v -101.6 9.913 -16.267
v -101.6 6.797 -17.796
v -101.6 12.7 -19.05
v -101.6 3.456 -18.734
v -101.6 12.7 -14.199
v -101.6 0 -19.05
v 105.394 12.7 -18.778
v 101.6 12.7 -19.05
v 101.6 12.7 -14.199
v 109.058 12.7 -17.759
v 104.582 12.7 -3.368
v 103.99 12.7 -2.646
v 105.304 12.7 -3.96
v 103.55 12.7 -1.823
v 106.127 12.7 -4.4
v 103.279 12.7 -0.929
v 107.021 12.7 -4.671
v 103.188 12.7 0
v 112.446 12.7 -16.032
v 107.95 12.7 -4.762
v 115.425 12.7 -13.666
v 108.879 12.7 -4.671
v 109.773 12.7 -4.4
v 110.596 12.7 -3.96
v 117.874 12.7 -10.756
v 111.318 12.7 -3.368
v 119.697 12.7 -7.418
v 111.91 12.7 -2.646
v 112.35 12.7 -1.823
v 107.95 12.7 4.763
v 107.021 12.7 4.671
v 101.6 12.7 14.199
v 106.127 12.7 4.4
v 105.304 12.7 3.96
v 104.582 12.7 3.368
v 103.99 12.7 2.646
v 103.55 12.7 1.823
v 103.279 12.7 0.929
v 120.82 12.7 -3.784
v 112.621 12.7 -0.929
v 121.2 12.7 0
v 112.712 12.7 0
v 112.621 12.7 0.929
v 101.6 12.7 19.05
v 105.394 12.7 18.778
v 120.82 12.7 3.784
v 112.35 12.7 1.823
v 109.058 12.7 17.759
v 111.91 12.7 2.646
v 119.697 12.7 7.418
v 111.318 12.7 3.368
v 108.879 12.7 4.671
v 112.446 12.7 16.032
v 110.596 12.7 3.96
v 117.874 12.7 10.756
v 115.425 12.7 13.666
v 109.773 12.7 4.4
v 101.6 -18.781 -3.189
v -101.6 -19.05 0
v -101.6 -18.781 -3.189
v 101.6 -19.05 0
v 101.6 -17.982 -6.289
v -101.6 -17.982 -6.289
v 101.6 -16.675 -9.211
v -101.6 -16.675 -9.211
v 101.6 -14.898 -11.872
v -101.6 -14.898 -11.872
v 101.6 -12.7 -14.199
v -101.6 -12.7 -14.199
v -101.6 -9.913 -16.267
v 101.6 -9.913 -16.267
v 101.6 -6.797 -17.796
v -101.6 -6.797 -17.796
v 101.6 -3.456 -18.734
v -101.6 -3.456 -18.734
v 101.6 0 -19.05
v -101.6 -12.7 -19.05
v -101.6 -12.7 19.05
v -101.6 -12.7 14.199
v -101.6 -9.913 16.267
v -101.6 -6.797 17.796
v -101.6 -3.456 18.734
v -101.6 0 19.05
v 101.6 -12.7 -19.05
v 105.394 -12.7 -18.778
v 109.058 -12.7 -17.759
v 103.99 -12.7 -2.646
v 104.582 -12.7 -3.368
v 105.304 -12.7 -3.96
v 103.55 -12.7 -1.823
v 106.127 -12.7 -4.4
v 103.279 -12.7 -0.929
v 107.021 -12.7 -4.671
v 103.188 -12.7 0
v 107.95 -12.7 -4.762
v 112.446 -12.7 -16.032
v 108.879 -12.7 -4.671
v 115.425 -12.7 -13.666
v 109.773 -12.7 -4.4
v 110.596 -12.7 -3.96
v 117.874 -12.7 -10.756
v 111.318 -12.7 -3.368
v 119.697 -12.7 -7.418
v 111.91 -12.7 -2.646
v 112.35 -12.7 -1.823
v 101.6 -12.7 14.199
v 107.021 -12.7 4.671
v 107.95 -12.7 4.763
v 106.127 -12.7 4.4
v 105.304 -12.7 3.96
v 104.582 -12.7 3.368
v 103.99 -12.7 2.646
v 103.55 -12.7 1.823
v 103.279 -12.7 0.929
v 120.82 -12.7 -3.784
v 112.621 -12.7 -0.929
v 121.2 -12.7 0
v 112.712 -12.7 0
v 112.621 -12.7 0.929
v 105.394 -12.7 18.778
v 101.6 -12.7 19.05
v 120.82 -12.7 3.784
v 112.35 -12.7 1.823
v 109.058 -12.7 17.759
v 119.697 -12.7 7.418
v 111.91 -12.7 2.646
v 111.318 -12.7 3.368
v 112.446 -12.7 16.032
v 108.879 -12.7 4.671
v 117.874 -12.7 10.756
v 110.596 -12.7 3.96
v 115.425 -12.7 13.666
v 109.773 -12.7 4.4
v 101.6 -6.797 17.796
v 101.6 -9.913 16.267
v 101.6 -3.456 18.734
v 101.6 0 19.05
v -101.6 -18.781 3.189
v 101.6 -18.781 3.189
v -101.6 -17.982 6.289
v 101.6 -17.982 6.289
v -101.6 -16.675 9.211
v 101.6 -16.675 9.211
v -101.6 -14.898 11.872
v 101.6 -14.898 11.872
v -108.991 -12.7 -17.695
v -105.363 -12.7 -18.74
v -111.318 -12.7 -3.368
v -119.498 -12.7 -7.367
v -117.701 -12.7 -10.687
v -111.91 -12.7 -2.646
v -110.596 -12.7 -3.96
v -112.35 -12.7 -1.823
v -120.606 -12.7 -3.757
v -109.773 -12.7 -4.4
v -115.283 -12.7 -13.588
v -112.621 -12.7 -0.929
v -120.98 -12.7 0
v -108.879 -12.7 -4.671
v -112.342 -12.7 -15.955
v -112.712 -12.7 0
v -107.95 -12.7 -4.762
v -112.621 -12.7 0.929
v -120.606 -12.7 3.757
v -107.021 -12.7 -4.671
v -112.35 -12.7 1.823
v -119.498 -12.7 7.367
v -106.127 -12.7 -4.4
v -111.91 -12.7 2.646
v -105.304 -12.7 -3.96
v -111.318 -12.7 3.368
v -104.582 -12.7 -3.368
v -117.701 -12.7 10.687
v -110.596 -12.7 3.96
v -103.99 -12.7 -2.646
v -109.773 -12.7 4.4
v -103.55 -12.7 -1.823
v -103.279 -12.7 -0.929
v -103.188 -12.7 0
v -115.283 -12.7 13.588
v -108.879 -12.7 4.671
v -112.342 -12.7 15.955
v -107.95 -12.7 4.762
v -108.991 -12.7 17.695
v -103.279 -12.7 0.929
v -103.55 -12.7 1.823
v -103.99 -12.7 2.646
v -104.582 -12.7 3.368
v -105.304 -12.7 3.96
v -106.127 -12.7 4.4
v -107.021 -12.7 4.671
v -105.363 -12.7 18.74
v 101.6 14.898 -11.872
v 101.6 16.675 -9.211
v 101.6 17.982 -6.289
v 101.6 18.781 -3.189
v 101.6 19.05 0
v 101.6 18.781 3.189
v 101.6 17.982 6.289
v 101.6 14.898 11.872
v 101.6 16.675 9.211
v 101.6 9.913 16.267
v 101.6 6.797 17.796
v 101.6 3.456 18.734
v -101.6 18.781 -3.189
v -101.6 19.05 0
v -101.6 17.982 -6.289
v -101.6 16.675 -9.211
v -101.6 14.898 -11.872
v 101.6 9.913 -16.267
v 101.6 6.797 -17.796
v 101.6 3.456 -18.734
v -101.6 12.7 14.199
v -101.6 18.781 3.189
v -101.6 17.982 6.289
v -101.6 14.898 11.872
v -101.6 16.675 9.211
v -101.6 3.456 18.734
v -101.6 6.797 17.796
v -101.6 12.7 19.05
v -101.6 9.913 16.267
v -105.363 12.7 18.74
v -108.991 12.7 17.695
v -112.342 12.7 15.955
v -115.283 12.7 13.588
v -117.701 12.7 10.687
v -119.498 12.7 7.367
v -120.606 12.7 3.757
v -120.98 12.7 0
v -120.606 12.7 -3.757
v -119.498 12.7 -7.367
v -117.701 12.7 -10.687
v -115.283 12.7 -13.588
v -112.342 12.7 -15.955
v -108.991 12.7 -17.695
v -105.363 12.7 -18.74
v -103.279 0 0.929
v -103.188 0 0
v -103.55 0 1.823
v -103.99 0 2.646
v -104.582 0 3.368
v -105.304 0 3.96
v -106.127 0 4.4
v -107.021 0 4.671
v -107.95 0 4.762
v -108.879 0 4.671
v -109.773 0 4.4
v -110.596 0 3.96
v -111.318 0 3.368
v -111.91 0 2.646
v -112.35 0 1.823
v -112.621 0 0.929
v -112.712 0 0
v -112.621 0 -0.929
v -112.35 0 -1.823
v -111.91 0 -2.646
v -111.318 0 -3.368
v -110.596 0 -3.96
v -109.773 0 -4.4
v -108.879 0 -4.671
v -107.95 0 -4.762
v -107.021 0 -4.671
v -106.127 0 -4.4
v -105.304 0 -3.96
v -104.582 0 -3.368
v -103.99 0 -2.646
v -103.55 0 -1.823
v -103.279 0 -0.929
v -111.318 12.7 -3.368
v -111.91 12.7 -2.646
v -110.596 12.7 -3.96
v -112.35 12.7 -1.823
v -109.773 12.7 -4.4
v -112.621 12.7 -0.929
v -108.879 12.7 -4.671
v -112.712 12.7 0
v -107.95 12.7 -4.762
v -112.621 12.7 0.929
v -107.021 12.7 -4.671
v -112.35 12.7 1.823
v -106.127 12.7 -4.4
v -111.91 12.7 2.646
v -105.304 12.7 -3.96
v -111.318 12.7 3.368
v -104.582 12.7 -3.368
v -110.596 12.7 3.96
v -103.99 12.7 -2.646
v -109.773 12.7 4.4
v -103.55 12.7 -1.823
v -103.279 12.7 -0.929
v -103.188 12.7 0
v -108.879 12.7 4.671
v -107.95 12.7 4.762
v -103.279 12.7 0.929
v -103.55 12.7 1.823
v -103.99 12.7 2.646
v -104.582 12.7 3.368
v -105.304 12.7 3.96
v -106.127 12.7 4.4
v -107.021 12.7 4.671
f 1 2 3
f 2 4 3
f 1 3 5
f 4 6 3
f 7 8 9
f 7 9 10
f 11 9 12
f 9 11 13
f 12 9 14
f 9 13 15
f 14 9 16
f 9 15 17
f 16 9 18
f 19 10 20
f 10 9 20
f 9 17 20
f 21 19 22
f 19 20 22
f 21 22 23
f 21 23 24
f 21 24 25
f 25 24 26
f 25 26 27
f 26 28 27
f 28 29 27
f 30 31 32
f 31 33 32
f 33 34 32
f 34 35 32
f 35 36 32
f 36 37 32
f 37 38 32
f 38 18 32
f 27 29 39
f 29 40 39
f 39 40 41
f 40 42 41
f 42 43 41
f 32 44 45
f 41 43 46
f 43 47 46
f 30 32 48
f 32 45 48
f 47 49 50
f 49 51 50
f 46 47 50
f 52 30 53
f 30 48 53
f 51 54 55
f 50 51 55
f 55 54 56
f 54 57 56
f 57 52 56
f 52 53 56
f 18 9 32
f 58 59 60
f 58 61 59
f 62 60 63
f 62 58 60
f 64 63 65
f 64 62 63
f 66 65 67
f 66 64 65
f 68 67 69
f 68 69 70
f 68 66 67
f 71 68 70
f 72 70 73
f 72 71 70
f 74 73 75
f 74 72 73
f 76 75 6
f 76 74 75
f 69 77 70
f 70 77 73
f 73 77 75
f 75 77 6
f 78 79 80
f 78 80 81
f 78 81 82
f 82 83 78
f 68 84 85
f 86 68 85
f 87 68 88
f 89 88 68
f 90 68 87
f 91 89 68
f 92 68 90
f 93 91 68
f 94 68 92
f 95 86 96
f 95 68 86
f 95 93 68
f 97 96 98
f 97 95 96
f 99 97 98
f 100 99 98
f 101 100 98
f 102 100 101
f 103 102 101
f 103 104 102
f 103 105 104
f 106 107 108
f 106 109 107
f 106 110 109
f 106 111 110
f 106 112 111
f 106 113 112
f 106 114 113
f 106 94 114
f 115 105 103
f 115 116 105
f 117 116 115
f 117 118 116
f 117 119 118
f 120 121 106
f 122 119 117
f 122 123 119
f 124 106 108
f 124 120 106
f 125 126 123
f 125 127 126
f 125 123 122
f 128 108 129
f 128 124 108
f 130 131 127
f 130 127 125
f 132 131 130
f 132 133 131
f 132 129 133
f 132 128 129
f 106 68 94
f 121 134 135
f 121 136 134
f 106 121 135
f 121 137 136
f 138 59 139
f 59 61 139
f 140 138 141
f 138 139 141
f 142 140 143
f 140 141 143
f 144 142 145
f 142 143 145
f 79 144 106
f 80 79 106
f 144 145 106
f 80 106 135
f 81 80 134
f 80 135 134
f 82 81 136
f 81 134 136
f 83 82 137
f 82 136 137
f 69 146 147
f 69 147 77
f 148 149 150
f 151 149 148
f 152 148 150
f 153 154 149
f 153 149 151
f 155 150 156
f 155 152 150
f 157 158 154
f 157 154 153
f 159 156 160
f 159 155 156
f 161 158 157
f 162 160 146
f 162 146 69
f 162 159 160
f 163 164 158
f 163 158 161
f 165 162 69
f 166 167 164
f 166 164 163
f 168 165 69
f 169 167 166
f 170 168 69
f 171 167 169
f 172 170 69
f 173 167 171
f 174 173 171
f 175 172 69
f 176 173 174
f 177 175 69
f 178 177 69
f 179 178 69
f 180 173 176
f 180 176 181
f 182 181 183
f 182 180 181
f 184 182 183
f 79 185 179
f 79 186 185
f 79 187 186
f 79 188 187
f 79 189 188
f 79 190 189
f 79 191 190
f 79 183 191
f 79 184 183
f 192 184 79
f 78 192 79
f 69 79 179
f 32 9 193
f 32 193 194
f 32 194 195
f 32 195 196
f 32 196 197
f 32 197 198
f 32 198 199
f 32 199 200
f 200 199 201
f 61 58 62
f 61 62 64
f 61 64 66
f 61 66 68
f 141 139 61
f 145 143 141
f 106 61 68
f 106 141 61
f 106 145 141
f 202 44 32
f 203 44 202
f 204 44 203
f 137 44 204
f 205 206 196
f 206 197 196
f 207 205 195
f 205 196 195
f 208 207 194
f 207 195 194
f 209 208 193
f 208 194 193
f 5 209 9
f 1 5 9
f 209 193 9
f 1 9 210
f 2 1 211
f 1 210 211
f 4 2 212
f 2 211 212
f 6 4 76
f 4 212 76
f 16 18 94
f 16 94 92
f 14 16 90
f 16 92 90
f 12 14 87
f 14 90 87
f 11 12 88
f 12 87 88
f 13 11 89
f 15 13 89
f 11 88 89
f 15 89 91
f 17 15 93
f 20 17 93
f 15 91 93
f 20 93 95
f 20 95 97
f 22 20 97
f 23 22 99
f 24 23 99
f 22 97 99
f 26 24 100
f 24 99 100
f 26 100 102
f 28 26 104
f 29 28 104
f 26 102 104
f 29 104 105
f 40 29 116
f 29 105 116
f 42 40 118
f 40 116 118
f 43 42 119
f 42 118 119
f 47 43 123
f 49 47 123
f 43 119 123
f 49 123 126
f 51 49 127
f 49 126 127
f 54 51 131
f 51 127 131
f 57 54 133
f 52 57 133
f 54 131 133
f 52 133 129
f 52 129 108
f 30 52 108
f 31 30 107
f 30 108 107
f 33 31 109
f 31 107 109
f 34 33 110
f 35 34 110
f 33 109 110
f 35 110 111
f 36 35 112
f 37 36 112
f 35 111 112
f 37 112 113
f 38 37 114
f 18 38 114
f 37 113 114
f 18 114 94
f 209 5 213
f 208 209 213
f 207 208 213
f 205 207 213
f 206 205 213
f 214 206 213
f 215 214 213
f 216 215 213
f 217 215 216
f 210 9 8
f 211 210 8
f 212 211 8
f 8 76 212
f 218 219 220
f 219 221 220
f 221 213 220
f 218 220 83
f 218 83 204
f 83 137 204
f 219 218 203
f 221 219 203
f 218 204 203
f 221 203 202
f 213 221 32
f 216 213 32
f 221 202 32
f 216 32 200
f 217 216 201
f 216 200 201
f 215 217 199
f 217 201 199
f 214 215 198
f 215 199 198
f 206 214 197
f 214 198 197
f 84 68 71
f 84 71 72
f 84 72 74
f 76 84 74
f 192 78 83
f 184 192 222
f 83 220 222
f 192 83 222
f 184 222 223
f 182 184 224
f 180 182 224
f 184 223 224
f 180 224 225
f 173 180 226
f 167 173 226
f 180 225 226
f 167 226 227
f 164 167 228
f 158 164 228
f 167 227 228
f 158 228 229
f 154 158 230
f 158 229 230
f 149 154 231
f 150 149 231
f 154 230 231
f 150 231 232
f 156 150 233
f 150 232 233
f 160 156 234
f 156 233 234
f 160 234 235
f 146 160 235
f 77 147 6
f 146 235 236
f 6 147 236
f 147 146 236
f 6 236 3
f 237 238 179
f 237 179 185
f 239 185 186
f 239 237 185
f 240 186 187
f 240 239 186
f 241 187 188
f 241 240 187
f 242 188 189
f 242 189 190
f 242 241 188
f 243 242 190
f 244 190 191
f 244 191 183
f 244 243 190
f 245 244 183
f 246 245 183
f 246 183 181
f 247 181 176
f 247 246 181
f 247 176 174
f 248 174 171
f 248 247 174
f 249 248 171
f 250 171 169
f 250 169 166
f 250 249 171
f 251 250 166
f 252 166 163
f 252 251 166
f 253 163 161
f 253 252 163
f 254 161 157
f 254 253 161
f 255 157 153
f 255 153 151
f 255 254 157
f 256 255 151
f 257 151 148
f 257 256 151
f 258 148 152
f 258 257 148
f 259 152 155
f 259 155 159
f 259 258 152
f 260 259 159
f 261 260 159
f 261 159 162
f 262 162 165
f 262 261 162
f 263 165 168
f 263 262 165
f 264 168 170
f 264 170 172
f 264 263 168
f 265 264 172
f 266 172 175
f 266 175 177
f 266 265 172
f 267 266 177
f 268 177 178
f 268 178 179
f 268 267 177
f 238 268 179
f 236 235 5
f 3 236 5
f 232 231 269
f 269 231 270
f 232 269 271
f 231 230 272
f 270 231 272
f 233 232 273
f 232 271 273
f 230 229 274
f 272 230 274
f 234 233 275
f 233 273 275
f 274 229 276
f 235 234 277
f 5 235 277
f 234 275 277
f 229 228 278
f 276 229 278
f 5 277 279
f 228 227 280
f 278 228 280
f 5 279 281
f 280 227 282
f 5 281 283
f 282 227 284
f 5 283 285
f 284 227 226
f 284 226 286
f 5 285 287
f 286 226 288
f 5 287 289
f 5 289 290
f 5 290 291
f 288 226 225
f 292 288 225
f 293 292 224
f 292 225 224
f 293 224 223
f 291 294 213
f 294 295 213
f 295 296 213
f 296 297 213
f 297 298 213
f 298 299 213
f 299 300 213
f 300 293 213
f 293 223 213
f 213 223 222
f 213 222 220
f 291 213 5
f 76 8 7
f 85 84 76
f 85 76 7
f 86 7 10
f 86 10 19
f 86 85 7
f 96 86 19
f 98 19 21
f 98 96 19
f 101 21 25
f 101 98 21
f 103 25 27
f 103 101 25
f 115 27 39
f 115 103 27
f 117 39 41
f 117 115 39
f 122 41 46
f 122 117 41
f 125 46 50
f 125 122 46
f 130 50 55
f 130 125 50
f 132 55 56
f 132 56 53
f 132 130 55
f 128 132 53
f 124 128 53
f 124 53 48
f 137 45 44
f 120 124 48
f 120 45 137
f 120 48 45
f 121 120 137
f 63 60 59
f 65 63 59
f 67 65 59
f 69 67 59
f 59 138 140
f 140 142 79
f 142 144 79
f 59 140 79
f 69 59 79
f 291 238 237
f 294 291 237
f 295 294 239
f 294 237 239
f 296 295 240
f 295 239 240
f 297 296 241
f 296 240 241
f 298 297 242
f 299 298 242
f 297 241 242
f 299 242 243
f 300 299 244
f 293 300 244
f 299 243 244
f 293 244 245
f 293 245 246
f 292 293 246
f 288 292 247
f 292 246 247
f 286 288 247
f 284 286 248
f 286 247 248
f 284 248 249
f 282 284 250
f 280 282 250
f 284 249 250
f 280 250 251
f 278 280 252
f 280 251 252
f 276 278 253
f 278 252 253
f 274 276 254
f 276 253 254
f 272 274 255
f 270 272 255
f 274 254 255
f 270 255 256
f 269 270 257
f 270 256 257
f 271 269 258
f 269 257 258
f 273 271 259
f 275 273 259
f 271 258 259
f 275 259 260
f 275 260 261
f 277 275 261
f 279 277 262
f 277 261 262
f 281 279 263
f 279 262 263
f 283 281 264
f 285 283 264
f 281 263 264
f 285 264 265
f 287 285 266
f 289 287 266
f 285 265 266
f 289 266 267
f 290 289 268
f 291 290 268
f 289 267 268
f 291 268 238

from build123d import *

# Parameters (mm, degrees)
F0_W     = 203.2
F0_H     = 38.1
F1_DEPTH = 19.05
F2_R     = 19.04999
F4_DEPTH = 12.7
F5_R     = 4.7625
F6_DEPTH = 12.7


# Not quite as in the source:
# - a fillet or chamfer is up to 0.001 mm smaller than in the source, because OpenCascade refuses the exact size


with BuildPart() as f1:
    # F0 (on Front) → F1 (new body, symmetric)
    with BuildSketch(Plane.XZ):
        Rectangle(F0_W, F0_H)
    extrude(amount=F1_DEPTH, both=True)

    # F2 (radius 19.05 in the source; OpenCascade refuses exactly that, so slightly less here)
    f2_edges = [f1.edges().sort_by_distance(p)[0] for p in [
        (0, -19.05, 19.05),
        (0, 19.05, 19.05),
        (0, 19.05, -19.05),
        (0, -19.05, -19.05),
    ]]
    fillet(f2_edges, radius=F2_R)

    # F3 (on Front) → F4 (join, symmetric)
    with BuildSketch(Plane.XZ):
        with BuildLine():
            Line((-101.6, -19.0500002354), (-101.6, 0))
            Line((-101.6, 0), (-101.6, 19.05))
            ThreePointArc((-101.6, 19.05), (-120.9801457995, -1.177e-07), (-101.6, -19.0500002354))
        make_face()
        with BuildLine():
            Line((101.6, 19.05), (101.6, 0))
            Line((101.6, 0), (101.6, -19.0500002354))
            ThreePointArc((101.6, -19.0500002354), (121.1996012404, -1.177e-07), (101.6, 19.05))
        make_face()
    extrude(amount=F4_DEPTH, both=True)

    # F5 (on Front) → F6 (cut, symmetric)
    with BuildSketch(Plane.XZ):
        with Locations((-107.95, 0)):
            Circle(F5_R)
        with BuildLine():
            ThreePointArc((112.7125, 0), (107.95, 4.7625), (103.1875, 0))
            ThreePointArc((103.1875, 0), (107.95, -4.7625), (112.7125, 0))
        make_face()
    extrude(amount=F6_DEPTH, both=True, mode=Mode.SUBTRACT)


solid = f1.part
